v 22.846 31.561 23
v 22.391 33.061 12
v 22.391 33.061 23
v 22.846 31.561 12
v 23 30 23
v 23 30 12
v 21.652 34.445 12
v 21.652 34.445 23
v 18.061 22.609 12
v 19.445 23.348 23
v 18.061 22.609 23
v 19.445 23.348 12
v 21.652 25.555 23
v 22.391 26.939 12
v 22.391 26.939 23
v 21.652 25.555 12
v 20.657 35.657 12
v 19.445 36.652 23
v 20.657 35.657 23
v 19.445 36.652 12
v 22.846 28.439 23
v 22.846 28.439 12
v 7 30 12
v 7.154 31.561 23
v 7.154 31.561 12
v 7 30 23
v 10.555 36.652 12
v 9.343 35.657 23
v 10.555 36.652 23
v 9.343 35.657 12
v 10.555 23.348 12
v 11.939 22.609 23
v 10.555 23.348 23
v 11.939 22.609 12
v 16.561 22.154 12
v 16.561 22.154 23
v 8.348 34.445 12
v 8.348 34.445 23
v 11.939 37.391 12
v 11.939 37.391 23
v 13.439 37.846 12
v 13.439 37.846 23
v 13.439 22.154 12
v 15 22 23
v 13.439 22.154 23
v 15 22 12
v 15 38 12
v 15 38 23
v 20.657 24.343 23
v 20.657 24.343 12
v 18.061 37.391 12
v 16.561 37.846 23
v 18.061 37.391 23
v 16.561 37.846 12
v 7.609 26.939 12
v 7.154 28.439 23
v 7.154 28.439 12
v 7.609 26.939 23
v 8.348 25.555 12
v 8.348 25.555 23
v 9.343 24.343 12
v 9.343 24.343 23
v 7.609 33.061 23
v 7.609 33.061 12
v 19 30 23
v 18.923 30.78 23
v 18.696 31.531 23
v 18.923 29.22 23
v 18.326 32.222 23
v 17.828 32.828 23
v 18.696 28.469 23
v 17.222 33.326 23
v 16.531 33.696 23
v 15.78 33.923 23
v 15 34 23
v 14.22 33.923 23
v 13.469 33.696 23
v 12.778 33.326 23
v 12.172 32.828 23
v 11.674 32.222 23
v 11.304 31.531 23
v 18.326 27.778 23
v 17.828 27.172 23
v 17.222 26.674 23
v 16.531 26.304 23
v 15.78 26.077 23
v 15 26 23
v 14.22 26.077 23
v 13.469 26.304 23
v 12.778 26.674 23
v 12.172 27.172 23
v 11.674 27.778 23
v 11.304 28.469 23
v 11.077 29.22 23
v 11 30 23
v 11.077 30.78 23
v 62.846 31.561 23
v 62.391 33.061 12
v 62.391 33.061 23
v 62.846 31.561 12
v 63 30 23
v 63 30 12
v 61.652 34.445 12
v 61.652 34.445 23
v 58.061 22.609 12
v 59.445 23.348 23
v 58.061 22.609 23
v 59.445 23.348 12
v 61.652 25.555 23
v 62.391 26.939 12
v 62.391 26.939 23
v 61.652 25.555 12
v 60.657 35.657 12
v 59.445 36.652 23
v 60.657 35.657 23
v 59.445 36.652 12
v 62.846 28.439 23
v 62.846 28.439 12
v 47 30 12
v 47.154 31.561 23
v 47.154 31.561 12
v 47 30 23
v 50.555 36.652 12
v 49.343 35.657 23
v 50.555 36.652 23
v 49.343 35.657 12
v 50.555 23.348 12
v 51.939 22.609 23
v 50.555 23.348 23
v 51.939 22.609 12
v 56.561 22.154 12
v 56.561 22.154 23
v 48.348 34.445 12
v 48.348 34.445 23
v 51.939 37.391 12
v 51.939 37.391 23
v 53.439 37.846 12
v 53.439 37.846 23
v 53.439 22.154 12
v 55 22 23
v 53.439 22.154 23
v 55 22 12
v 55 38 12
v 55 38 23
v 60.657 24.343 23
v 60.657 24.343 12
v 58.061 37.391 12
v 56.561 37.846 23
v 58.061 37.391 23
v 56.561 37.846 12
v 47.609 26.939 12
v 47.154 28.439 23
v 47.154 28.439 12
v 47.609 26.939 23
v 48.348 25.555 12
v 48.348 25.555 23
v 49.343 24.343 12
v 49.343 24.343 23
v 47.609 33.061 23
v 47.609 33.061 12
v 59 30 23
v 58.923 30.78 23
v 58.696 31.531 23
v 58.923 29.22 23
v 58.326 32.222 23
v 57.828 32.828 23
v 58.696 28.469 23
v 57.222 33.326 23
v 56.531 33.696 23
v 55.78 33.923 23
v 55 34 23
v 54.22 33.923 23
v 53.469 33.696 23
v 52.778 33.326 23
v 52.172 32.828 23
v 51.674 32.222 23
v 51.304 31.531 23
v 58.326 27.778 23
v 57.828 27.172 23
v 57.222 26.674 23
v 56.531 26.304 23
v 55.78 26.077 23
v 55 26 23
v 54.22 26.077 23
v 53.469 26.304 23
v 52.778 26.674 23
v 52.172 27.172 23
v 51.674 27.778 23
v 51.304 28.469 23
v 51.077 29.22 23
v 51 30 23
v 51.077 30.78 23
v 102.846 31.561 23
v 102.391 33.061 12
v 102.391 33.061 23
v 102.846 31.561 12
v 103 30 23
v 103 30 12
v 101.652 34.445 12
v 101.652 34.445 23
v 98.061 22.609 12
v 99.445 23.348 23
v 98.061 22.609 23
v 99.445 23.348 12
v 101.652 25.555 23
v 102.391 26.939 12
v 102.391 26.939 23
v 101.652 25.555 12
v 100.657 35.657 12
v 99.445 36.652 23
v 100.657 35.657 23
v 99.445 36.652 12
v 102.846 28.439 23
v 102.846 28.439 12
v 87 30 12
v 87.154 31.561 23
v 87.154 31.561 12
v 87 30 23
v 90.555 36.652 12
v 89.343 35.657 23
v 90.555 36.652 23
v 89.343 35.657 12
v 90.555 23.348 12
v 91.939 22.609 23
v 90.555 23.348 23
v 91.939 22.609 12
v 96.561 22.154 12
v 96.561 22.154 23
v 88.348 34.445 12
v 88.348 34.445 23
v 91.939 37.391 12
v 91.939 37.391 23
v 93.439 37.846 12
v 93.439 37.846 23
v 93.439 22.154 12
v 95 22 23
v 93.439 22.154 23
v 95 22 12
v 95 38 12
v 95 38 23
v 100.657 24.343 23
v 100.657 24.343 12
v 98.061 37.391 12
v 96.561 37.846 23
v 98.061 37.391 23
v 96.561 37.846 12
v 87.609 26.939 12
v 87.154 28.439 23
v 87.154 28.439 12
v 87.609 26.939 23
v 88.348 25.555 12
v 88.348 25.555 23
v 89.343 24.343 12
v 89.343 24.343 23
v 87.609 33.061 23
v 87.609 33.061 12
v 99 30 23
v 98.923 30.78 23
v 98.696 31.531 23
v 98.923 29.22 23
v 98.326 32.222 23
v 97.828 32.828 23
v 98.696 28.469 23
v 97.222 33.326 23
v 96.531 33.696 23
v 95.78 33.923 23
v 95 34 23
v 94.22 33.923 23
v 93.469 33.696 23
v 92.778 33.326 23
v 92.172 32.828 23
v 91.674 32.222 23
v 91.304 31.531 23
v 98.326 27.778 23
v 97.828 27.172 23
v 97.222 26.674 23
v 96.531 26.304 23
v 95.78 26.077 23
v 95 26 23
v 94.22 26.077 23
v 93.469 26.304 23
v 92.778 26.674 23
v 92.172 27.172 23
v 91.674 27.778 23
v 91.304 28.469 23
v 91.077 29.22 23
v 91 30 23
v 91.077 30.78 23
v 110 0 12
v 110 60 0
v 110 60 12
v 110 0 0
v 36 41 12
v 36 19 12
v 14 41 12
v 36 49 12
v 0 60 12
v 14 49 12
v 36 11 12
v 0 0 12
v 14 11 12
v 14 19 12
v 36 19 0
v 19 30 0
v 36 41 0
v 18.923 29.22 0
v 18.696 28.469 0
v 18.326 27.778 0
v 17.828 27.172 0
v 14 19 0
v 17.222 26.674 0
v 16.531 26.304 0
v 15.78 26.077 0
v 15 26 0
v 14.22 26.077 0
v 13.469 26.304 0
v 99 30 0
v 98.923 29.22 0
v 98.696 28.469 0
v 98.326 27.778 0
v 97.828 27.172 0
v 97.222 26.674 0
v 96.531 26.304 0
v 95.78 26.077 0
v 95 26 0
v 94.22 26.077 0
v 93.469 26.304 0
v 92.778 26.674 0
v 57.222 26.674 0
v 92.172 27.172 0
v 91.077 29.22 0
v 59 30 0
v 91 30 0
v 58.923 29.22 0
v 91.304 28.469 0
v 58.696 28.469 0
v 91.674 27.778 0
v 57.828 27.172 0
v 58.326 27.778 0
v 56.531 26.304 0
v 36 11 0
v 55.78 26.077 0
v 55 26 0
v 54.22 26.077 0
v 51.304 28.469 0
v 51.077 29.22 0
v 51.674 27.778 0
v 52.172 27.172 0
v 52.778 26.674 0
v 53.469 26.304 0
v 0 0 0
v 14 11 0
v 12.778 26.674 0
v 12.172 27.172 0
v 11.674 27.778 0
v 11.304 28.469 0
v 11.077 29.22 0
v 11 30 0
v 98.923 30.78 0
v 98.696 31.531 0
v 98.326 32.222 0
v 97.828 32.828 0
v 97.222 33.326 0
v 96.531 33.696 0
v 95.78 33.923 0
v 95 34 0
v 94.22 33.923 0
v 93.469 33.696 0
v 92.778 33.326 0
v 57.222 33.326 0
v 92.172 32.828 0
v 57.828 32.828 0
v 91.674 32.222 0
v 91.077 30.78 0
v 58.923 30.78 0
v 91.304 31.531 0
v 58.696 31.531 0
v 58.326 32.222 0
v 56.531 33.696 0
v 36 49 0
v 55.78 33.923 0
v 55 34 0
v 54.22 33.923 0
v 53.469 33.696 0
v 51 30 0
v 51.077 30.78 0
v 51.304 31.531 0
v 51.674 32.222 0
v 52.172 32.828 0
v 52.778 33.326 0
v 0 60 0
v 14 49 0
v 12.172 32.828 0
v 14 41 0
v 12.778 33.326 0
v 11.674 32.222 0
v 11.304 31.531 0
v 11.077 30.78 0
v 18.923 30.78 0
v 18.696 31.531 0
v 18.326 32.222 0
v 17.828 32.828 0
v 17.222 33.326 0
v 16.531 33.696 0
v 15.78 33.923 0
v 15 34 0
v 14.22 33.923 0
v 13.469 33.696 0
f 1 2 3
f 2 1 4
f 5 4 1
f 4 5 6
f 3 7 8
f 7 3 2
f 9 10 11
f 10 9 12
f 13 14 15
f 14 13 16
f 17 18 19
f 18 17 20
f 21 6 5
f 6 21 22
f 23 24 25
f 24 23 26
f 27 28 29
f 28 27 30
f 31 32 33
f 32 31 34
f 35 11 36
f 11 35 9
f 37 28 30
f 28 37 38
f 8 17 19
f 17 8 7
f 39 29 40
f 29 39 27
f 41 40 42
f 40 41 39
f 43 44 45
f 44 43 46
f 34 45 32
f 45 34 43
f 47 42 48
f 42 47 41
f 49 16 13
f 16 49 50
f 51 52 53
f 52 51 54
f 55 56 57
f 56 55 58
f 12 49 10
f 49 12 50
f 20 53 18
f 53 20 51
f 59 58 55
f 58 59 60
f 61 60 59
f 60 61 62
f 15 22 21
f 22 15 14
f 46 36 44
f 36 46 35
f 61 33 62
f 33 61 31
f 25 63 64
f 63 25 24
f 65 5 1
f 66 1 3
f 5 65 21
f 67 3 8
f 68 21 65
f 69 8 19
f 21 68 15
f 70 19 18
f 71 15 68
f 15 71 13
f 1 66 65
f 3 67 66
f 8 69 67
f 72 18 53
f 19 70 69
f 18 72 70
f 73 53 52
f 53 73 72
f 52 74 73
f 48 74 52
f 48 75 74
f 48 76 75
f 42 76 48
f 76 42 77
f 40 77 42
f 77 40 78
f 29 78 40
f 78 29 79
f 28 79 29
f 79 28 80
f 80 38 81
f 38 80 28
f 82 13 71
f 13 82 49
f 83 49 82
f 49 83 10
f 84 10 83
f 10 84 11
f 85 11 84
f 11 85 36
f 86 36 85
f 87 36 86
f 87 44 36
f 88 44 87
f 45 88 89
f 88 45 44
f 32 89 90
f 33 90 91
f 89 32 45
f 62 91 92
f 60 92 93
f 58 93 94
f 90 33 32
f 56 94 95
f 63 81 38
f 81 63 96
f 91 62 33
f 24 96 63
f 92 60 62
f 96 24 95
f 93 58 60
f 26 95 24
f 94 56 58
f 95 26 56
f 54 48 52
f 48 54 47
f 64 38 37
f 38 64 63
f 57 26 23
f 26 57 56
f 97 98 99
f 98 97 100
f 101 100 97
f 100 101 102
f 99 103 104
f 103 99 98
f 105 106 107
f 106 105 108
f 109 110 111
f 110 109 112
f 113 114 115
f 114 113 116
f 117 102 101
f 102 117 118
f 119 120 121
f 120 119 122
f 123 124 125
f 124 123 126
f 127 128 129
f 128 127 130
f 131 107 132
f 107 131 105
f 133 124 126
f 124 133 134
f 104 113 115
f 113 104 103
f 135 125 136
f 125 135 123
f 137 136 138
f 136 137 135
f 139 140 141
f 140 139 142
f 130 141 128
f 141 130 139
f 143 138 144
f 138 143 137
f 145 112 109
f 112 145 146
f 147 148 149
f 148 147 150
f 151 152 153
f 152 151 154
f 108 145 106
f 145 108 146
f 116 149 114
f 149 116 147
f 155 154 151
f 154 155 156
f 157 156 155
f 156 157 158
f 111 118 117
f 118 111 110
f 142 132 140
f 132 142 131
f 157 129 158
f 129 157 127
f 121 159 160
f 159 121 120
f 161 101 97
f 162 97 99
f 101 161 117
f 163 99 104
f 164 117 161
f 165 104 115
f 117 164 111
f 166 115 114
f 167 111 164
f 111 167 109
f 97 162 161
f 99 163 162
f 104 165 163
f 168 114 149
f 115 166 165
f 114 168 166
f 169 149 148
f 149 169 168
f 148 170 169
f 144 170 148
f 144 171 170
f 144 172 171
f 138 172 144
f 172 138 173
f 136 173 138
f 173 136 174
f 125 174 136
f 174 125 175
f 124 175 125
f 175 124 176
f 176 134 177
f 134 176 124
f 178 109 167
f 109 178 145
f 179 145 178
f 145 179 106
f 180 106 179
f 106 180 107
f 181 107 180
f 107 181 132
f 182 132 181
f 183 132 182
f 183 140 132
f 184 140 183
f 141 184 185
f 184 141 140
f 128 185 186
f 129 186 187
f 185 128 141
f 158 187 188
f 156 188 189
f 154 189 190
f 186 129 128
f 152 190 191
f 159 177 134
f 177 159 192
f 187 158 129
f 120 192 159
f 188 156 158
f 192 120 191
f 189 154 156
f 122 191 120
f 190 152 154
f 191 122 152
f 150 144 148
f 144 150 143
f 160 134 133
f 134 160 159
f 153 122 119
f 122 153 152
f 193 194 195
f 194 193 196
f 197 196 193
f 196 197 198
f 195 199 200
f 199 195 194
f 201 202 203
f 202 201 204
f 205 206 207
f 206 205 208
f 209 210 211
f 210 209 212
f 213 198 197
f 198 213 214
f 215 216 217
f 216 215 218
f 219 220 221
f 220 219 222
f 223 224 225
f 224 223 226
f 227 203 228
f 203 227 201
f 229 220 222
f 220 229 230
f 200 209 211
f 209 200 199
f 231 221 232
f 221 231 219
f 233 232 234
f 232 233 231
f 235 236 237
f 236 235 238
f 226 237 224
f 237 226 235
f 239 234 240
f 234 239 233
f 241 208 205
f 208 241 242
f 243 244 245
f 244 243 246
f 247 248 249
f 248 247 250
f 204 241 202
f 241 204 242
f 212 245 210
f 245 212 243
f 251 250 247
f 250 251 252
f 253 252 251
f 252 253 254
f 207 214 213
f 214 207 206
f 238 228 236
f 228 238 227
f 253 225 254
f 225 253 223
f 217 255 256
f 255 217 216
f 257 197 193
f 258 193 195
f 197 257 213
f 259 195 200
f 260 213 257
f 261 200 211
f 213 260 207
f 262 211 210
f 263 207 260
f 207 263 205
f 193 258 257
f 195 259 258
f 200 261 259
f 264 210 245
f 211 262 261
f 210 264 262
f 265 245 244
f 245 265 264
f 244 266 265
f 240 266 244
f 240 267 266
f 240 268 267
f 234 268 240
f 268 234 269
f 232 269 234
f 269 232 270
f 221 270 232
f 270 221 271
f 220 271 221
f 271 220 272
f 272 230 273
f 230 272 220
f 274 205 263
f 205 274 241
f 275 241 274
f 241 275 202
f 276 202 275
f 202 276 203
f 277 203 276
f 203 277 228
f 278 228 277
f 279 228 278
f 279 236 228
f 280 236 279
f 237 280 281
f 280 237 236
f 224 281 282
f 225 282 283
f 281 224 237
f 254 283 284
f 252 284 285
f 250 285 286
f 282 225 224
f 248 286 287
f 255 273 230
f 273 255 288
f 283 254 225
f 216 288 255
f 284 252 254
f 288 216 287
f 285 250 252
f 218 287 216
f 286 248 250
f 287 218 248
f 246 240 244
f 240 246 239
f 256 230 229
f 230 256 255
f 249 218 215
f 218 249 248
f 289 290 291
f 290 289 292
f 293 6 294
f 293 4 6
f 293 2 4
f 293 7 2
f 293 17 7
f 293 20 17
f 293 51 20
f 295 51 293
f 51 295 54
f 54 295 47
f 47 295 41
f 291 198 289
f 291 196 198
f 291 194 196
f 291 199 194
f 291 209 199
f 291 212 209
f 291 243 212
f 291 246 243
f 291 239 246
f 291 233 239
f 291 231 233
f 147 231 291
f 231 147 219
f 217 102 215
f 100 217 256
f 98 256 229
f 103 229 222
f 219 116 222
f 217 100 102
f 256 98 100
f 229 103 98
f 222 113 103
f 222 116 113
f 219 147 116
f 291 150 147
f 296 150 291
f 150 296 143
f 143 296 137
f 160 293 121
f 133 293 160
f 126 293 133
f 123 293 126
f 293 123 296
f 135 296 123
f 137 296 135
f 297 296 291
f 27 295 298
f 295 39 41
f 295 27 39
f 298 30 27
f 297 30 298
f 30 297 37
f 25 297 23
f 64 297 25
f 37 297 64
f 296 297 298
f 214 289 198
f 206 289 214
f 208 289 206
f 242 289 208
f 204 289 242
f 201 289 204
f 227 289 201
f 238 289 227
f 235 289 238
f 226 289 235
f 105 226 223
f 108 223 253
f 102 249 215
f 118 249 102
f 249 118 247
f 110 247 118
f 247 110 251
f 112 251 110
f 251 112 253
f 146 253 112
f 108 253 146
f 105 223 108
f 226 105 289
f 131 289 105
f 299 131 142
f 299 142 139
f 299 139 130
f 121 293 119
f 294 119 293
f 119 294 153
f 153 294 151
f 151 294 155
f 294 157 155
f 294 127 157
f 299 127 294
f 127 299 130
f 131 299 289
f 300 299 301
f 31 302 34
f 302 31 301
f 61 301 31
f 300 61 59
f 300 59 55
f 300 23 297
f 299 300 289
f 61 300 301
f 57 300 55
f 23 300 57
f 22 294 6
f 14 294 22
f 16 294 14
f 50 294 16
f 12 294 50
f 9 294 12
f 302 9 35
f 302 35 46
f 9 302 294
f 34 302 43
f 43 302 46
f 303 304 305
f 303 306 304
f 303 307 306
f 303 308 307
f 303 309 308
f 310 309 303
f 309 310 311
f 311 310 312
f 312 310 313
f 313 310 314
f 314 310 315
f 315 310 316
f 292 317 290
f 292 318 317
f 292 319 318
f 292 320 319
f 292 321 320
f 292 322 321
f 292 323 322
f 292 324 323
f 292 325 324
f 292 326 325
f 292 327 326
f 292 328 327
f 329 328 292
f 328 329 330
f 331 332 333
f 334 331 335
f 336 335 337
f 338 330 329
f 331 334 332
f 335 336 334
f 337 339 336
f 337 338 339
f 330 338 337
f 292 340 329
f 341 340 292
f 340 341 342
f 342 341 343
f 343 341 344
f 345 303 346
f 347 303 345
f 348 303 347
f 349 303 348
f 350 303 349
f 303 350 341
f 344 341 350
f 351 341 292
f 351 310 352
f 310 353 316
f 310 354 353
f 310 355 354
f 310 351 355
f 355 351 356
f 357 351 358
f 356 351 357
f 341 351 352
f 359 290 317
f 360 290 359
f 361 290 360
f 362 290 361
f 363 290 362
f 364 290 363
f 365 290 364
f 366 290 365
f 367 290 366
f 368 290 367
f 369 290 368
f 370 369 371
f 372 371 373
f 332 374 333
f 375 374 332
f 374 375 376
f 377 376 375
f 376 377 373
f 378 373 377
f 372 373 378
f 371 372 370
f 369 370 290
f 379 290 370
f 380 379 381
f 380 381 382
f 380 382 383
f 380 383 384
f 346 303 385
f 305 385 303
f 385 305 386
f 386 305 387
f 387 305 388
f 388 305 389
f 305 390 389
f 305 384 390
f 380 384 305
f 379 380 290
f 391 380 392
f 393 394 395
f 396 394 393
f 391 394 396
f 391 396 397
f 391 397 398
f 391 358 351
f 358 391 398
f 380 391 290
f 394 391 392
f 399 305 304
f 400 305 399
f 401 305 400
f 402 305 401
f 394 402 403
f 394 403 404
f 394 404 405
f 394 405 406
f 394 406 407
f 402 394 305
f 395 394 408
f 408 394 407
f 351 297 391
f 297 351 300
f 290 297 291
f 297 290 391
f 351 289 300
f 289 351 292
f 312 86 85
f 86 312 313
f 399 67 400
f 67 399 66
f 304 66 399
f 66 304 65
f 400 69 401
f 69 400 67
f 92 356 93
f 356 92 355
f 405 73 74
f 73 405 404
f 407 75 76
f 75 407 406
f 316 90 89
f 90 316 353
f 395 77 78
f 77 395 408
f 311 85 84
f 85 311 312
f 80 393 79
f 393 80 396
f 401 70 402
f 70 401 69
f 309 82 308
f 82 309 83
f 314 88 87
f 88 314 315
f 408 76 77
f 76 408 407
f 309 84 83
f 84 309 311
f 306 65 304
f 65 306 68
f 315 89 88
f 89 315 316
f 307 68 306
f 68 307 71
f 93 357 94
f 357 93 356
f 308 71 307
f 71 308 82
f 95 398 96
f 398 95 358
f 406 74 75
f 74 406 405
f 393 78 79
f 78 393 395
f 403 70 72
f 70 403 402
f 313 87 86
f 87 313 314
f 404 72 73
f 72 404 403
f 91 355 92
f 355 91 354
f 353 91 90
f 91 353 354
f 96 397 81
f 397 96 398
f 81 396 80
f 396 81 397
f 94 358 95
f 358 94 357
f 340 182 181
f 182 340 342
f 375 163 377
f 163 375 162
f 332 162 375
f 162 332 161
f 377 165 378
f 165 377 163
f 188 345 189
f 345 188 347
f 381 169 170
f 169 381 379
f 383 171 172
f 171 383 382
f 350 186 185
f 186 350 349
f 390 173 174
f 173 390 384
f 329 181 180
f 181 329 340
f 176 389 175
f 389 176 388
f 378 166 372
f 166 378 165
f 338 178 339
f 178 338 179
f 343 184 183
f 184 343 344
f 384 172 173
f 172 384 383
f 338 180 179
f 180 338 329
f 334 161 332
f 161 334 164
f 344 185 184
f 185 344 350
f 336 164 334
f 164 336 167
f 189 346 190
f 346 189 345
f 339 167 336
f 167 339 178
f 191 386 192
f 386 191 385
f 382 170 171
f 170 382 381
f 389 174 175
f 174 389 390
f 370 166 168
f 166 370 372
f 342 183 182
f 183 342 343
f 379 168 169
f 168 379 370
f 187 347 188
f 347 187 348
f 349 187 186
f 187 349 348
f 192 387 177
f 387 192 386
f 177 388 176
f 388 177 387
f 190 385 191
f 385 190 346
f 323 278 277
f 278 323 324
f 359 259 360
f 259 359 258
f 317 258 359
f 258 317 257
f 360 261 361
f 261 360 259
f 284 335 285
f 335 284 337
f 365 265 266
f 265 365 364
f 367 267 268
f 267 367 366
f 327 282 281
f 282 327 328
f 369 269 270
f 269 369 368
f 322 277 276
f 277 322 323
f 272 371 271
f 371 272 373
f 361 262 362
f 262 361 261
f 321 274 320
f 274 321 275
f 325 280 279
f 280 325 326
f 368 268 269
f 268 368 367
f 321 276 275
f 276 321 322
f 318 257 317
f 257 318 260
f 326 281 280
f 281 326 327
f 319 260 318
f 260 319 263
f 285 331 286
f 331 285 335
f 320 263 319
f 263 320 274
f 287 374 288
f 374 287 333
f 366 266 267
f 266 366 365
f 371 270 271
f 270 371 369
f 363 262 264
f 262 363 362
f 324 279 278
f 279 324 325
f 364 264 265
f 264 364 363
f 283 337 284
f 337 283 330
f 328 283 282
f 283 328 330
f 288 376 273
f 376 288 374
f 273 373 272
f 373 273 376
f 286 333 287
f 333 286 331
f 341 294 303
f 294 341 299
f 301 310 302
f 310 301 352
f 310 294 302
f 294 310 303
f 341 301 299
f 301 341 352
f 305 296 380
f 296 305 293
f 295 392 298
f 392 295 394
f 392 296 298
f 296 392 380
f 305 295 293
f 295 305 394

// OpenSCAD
$fn = 32;

// ----------------------------------------------------------------------
// Drill jig: three_boss_slot jig
// ----------------------------------------------------------------------

// --- parameters (mm) ---
plate_l = 110;            // plate length, X
plate_w = 60;             // plate width, Y
plate_t = 12;             // plate thickness
boss_d = 16;              // guide boss diameter
boss_h = 12;              // boss height above the plate
guide_d = 8;              // guide hole diameter
boss_pitch = 40;          // boss pitch
slot_w = 8;               // clamp slot width
slot_l = 22;              // clamp slot length
slot_x = 14;              // slot start X

n_boss = 3;  // guide bosses
boss_x0 = (plate_l - (n_boss - 1) * boss_pitch) / 2;  // first boss X
boss_top = plate_t - 1 + boss_h;  // boss crown height
total_h = boss_top;  // overall height

difference() {
  union() {
  cube([plate_l, plate_w, plate_t]);
  for (i = [0 : n_boss - 1])
    translate([boss_x0 + i * boss_pitch, plate_w / 2, plate_t - 1])
      cylinder(h = boss_h, d = boss_d);
  }
  for (i = [0 : n_boss - 1])
    translate([boss_x0 + i * boss_pitch, plate_w / 2, -1])
      cylinder(h = plate_t + boss_h, d = guide_d);
  for (cy = [plate_w * 0.25, plate_w * 0.75])
    translate([slot_x, cy - slot_w / 2, -1])
      cube([slot_l, slot_w, plate_t + 2]);
}
